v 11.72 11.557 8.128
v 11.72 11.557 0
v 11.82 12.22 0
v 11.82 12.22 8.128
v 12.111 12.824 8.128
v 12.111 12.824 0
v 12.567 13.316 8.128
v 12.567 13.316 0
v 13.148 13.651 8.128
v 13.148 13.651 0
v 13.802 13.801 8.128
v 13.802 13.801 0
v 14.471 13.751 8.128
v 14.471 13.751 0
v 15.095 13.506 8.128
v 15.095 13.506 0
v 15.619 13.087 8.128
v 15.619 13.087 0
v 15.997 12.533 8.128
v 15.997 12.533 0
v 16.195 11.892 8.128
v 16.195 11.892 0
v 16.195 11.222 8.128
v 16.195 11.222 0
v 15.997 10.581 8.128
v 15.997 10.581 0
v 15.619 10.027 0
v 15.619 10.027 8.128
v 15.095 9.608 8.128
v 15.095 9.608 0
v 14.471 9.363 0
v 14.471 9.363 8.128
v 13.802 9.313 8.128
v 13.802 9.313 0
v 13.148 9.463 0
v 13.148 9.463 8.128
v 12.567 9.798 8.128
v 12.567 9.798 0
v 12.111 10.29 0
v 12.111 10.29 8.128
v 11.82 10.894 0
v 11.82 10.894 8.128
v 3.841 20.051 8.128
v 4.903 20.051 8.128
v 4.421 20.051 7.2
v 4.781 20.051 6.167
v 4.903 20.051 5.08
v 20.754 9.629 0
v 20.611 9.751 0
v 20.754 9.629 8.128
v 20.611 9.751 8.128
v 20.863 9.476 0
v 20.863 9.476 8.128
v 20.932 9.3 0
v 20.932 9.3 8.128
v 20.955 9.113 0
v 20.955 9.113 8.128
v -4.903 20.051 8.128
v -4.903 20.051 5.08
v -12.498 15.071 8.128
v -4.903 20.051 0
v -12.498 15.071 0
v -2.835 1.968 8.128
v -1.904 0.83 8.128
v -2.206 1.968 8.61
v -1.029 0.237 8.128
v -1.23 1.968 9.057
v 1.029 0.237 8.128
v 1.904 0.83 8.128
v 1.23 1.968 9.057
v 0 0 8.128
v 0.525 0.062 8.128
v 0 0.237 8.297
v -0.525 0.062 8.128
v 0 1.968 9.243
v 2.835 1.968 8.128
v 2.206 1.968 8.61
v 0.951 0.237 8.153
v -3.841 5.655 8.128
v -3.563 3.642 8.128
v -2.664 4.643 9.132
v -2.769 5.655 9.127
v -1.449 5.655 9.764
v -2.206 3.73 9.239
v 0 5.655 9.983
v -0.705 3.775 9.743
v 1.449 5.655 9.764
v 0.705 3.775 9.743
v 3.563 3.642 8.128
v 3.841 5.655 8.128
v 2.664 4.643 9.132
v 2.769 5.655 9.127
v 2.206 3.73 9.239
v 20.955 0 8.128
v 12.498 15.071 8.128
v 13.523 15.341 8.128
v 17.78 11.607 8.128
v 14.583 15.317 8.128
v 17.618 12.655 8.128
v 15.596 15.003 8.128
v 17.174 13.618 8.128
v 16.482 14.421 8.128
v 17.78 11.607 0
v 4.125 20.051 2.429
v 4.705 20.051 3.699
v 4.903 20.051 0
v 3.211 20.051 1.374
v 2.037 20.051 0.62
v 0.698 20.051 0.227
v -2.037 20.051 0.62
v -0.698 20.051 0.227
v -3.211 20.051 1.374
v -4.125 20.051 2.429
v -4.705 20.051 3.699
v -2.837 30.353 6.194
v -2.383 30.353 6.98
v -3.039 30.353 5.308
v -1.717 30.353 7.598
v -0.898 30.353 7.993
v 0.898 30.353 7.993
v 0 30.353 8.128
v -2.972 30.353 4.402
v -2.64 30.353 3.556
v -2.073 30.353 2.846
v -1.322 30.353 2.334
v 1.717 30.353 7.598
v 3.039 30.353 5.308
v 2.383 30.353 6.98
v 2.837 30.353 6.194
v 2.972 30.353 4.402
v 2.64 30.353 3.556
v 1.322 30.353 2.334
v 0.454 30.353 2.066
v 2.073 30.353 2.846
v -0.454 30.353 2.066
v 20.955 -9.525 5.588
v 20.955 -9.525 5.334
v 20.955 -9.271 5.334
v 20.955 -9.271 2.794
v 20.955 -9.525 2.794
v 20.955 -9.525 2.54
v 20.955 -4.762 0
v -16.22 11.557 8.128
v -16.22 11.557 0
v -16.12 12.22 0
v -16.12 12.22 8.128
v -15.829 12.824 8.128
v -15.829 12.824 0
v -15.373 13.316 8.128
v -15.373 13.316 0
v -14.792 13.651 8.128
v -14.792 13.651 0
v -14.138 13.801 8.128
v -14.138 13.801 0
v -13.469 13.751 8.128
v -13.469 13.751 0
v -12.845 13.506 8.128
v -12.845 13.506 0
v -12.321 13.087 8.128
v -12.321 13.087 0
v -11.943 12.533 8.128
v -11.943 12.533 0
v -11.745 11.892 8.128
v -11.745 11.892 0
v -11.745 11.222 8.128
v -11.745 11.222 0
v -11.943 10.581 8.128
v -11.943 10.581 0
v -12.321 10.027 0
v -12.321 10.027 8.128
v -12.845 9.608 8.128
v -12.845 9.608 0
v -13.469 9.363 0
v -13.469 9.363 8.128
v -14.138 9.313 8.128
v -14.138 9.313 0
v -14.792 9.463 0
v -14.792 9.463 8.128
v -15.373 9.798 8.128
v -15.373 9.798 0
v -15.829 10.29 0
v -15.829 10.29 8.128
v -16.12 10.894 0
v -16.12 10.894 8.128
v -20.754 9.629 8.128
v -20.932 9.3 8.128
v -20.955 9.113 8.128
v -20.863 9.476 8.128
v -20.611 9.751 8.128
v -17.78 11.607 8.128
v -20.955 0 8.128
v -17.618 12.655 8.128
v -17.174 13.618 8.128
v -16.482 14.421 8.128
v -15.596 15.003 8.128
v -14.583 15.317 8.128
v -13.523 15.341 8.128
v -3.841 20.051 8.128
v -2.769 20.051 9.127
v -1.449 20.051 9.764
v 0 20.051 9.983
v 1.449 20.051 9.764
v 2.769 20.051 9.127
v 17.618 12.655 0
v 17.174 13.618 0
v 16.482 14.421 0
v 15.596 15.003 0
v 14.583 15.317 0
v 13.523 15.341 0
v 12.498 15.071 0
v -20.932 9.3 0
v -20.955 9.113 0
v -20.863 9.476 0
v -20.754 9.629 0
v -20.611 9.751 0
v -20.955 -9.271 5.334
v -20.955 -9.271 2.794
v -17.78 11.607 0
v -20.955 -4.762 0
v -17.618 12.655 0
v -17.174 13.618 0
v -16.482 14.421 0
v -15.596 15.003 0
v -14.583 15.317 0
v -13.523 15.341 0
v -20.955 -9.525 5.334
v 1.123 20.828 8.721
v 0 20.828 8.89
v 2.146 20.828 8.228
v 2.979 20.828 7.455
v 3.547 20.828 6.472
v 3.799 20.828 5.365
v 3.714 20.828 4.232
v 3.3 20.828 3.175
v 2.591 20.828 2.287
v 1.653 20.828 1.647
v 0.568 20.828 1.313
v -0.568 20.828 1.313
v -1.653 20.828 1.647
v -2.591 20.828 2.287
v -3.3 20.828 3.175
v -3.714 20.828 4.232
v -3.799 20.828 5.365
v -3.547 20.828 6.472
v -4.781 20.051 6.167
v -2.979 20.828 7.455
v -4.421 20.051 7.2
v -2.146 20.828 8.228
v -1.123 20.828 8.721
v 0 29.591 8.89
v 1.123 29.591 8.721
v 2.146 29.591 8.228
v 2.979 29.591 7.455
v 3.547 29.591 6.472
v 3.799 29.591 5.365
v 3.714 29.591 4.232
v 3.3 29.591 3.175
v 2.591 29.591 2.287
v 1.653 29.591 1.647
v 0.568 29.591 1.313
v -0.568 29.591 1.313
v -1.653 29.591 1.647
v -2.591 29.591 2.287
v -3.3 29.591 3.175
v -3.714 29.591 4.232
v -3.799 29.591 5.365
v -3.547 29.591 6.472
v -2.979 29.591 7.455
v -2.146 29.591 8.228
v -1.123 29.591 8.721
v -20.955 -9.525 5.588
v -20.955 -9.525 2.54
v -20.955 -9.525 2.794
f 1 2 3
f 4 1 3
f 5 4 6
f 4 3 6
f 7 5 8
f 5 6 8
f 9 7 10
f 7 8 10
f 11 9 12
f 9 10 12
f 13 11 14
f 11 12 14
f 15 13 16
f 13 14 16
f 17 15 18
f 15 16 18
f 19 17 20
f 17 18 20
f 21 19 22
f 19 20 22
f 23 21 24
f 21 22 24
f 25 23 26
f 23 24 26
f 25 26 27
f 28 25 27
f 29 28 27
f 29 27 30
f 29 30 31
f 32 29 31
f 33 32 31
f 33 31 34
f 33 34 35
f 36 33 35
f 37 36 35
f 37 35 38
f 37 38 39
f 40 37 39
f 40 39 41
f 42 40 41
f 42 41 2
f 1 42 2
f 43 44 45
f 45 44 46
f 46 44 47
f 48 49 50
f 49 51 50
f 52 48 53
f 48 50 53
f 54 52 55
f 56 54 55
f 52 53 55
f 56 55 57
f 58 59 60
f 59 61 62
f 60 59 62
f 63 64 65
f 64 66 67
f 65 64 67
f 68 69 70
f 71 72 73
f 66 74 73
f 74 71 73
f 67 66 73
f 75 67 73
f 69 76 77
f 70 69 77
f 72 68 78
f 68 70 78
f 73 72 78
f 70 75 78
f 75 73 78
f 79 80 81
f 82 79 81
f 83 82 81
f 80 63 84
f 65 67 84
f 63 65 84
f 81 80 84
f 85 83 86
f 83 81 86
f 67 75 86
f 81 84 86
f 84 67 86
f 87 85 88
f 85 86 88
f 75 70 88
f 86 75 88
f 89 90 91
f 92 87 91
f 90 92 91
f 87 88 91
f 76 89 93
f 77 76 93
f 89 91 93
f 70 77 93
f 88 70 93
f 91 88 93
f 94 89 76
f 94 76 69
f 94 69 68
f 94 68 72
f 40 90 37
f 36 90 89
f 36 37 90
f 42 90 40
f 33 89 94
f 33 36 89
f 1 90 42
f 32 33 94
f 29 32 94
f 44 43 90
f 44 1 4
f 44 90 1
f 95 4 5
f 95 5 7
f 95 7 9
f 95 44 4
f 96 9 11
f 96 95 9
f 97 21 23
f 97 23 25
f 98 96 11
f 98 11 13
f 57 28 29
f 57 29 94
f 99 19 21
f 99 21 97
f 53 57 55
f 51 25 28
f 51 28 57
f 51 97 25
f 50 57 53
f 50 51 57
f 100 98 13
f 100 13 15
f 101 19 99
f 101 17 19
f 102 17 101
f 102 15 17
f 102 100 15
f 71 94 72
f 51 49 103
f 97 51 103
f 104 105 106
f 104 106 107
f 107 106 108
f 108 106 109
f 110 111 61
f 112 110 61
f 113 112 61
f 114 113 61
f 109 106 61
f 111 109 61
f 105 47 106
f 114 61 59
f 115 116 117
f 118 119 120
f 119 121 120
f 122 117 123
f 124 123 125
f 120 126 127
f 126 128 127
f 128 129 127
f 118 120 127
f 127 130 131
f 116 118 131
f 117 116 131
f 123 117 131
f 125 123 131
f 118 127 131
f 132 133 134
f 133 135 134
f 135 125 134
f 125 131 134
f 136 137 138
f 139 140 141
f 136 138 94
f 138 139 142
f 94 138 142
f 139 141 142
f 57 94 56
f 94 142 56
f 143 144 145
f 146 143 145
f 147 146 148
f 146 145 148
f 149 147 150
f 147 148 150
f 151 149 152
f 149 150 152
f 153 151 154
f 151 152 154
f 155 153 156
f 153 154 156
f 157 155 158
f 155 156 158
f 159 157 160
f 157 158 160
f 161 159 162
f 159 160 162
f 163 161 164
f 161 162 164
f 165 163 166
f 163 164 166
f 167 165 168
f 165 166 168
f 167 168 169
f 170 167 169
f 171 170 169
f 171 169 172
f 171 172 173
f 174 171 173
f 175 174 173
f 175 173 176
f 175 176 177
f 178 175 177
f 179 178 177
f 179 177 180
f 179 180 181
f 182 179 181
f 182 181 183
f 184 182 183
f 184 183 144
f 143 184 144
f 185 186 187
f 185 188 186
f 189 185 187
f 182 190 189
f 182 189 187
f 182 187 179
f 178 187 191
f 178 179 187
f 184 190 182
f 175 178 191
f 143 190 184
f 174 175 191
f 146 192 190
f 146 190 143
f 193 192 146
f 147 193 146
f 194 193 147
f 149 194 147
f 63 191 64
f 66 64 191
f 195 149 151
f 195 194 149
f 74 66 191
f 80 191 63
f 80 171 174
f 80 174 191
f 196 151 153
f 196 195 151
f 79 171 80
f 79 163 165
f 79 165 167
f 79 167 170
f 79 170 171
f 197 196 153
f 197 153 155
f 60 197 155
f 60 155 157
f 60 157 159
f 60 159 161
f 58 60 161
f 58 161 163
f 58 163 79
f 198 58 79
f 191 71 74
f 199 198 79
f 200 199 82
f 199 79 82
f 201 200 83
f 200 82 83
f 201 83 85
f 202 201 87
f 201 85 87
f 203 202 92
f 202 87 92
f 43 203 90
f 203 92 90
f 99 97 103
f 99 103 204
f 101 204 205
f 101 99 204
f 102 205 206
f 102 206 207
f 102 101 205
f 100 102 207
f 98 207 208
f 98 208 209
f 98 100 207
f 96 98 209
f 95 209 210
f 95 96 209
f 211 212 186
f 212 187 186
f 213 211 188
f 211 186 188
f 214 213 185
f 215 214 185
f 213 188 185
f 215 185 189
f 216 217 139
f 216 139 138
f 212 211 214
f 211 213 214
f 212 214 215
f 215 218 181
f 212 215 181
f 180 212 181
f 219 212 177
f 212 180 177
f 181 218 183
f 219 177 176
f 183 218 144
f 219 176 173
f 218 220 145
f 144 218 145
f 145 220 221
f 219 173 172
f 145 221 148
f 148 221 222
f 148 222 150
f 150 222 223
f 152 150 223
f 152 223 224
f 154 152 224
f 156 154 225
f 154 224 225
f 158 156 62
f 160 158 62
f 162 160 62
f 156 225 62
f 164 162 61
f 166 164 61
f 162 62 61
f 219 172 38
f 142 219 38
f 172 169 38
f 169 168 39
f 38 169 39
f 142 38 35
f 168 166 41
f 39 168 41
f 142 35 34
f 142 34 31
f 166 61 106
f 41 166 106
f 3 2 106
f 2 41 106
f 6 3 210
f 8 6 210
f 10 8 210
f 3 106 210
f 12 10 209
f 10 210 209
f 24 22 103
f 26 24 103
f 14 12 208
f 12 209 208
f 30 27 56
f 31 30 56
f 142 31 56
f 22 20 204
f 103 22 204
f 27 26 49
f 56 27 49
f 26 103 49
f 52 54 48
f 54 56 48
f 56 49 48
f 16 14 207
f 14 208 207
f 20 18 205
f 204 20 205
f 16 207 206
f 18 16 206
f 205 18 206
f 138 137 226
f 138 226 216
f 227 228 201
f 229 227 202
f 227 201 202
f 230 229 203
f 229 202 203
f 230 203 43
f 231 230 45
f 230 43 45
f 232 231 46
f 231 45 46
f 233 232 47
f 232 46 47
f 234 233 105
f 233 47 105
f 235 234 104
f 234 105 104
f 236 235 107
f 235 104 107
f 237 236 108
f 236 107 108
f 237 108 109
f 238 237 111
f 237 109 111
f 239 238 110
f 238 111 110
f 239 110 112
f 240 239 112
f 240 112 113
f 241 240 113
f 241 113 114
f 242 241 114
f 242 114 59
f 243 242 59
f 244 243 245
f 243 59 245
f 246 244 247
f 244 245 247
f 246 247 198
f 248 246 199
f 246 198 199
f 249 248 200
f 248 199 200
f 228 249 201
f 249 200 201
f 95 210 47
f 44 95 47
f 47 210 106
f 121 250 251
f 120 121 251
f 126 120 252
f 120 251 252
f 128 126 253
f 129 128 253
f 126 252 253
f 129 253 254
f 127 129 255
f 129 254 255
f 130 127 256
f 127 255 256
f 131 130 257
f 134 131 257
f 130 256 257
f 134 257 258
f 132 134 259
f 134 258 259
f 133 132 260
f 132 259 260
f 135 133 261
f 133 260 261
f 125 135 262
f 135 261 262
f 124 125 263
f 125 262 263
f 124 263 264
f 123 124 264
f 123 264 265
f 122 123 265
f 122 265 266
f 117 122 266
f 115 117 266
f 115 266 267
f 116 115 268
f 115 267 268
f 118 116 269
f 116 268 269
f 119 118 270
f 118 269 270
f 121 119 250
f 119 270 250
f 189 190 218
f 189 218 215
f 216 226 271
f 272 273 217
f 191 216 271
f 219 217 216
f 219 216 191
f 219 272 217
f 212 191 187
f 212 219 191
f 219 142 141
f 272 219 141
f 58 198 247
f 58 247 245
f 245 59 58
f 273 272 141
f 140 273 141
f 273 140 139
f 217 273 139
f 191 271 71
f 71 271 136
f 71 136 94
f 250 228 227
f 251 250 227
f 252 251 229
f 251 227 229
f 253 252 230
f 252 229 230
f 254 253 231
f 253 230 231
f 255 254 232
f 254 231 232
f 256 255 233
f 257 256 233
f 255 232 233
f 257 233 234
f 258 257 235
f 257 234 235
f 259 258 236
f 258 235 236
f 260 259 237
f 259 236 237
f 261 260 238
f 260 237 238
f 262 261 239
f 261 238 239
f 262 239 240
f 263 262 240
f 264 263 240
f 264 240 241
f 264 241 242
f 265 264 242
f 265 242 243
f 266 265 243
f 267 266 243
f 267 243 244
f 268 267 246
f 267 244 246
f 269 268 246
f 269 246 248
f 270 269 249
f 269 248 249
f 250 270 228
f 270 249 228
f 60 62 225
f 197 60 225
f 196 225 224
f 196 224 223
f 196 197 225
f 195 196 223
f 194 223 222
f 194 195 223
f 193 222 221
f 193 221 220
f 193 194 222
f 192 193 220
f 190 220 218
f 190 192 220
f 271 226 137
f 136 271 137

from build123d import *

# Parameters (mm, degrees)
F0_W      = 41.91
F0_H      = 19.05
F1_DEPTH  = 8.128
F3_DEPTH  = 41.911
F4_W      = 0.508
F4_H      = 2.54
F5_DEPTH  = 41.911
F8_SIZE   = 0.762
F10_DEPTH = 8.128
F11_R     = 3.81
F12_DEPTH = 8.128
F14_D     = 4.5
F14_DEPTH = 38.1
F14_TIP   = 1.3519363928
F15_R     = 0.762


with BuildPart() as f1:
    # F0 (on Top) → F1 (new body)
    with BuildSketch(Plane.XY):
        Rectangle(F0_W, F0_H)
    extrude(amount=F1_DEPTH)

    # F2 (on face) → F3 (cut, through all)
    with BuildSketch(Plane.YZ.offset(20.955)):
        Polygon((-9.525, 5.588), (0, 8.128), (-9.525, 8.128), align=None)
        Polygon((-4.7625, 0), (-9.525, 2.54), (-9.525, 0), align=None)
    extrude(amount=-F3_DEPTH, mode=Mode.SUBTRACT)

    # F4 (on face) → F5 (cut, through all)
    with BuildSketch(Plane.YZ.offset(20.955)):
        with Locations((-9.525, 4.064)):
            Rectangle(F4_W, F4_H)
    extrude(amount=-F5_DEPTH, mode=Mode.SUBTRACT)

    # F6 (on Right) → F7 (revolve)
    with BuildSketch(Plane.YZ):
        with BuildLine():
            Line((0, 5.08), (30.353, 5.08))
            Line((30.353, 5.08), (30.353, 8.89))
            Line((30.353, 8.89), (20.828, 8.89))
            Line((20.828, 8.89), (20.051436257, 9.983367576))
            Line((20.051436257, 9.983367576), (5.6547833958, 9.983367576))
            ThreePointArc((5.6547833958, 9.983367576), (2.6790917075, 9.507672027), (0, 8.128))
            Line((0, 8.128), (0, 5.08))
        make_face()
    revolve(axis=Axis((0, 15.1765, 5.08), (0, 1, 0)))

    # F8
    f8_edges = [f1.edges().sort_by_distance(p)[0] for p in [
        (0, 30.353, 1.27),
    ]]
    chamfer(f8_edges, length=F8_SIZE)

    # F9 (on Top) → F10 (join, through all)
    with BuildSketch(Plane.XY):
        Polygon((-3.8409256157, 9.525), (3.8409256157, 9.525), (4.903367576, 9.525), (4.903367576, 20.051436257), (-4.903367576, 20.051436257), (-4.903367576, 9.525), align=None)
        Polygon((4.903367576, 20.051436257), (4.903367576, 9.525), (20.955, 9.525), align=None)
        Polygon((-20.955, 9.525), (-4.903367576, 9.525), (-4.903367576, 20.051436257), align=None)
    extrude(amount=F10_DEPTH)

    # F11 (on face) → F12 (join, through all)
    with BuildSketch(Plane.XY.offset(8.128)):
        with Locations((13.97, 11.557)):
            Circle(F11_R)
        with Locations((-13.97, 11.557)):
            Circle(F11_R)
    extrude(amount=-F12_DEPTH)

    # F14
    with Locations(Plane.XY.offset(8.128)):
        with Locations((-13.97, 11.557), (13.97, 11.557)):
            Hole(F14_D / 2, depth=F14_DEPTH)
            with Locations((0, 0, -(F14_DEPTH + F14_TIP / 2))):  # 118° drill point
                Cone(0, F14_D / 2, F14_TIP, mode=Mode.SUBTRACT)

    # F15
    f15_edges = [f1.edges().sort_by_distance(p)[0] for p in [
        (20.955, 9.525, 4.064),
        (-20.955, 9.525, 4.064),
    ]]
    fillet(f15_edges, radius=F15_R)


solid = f1.part
